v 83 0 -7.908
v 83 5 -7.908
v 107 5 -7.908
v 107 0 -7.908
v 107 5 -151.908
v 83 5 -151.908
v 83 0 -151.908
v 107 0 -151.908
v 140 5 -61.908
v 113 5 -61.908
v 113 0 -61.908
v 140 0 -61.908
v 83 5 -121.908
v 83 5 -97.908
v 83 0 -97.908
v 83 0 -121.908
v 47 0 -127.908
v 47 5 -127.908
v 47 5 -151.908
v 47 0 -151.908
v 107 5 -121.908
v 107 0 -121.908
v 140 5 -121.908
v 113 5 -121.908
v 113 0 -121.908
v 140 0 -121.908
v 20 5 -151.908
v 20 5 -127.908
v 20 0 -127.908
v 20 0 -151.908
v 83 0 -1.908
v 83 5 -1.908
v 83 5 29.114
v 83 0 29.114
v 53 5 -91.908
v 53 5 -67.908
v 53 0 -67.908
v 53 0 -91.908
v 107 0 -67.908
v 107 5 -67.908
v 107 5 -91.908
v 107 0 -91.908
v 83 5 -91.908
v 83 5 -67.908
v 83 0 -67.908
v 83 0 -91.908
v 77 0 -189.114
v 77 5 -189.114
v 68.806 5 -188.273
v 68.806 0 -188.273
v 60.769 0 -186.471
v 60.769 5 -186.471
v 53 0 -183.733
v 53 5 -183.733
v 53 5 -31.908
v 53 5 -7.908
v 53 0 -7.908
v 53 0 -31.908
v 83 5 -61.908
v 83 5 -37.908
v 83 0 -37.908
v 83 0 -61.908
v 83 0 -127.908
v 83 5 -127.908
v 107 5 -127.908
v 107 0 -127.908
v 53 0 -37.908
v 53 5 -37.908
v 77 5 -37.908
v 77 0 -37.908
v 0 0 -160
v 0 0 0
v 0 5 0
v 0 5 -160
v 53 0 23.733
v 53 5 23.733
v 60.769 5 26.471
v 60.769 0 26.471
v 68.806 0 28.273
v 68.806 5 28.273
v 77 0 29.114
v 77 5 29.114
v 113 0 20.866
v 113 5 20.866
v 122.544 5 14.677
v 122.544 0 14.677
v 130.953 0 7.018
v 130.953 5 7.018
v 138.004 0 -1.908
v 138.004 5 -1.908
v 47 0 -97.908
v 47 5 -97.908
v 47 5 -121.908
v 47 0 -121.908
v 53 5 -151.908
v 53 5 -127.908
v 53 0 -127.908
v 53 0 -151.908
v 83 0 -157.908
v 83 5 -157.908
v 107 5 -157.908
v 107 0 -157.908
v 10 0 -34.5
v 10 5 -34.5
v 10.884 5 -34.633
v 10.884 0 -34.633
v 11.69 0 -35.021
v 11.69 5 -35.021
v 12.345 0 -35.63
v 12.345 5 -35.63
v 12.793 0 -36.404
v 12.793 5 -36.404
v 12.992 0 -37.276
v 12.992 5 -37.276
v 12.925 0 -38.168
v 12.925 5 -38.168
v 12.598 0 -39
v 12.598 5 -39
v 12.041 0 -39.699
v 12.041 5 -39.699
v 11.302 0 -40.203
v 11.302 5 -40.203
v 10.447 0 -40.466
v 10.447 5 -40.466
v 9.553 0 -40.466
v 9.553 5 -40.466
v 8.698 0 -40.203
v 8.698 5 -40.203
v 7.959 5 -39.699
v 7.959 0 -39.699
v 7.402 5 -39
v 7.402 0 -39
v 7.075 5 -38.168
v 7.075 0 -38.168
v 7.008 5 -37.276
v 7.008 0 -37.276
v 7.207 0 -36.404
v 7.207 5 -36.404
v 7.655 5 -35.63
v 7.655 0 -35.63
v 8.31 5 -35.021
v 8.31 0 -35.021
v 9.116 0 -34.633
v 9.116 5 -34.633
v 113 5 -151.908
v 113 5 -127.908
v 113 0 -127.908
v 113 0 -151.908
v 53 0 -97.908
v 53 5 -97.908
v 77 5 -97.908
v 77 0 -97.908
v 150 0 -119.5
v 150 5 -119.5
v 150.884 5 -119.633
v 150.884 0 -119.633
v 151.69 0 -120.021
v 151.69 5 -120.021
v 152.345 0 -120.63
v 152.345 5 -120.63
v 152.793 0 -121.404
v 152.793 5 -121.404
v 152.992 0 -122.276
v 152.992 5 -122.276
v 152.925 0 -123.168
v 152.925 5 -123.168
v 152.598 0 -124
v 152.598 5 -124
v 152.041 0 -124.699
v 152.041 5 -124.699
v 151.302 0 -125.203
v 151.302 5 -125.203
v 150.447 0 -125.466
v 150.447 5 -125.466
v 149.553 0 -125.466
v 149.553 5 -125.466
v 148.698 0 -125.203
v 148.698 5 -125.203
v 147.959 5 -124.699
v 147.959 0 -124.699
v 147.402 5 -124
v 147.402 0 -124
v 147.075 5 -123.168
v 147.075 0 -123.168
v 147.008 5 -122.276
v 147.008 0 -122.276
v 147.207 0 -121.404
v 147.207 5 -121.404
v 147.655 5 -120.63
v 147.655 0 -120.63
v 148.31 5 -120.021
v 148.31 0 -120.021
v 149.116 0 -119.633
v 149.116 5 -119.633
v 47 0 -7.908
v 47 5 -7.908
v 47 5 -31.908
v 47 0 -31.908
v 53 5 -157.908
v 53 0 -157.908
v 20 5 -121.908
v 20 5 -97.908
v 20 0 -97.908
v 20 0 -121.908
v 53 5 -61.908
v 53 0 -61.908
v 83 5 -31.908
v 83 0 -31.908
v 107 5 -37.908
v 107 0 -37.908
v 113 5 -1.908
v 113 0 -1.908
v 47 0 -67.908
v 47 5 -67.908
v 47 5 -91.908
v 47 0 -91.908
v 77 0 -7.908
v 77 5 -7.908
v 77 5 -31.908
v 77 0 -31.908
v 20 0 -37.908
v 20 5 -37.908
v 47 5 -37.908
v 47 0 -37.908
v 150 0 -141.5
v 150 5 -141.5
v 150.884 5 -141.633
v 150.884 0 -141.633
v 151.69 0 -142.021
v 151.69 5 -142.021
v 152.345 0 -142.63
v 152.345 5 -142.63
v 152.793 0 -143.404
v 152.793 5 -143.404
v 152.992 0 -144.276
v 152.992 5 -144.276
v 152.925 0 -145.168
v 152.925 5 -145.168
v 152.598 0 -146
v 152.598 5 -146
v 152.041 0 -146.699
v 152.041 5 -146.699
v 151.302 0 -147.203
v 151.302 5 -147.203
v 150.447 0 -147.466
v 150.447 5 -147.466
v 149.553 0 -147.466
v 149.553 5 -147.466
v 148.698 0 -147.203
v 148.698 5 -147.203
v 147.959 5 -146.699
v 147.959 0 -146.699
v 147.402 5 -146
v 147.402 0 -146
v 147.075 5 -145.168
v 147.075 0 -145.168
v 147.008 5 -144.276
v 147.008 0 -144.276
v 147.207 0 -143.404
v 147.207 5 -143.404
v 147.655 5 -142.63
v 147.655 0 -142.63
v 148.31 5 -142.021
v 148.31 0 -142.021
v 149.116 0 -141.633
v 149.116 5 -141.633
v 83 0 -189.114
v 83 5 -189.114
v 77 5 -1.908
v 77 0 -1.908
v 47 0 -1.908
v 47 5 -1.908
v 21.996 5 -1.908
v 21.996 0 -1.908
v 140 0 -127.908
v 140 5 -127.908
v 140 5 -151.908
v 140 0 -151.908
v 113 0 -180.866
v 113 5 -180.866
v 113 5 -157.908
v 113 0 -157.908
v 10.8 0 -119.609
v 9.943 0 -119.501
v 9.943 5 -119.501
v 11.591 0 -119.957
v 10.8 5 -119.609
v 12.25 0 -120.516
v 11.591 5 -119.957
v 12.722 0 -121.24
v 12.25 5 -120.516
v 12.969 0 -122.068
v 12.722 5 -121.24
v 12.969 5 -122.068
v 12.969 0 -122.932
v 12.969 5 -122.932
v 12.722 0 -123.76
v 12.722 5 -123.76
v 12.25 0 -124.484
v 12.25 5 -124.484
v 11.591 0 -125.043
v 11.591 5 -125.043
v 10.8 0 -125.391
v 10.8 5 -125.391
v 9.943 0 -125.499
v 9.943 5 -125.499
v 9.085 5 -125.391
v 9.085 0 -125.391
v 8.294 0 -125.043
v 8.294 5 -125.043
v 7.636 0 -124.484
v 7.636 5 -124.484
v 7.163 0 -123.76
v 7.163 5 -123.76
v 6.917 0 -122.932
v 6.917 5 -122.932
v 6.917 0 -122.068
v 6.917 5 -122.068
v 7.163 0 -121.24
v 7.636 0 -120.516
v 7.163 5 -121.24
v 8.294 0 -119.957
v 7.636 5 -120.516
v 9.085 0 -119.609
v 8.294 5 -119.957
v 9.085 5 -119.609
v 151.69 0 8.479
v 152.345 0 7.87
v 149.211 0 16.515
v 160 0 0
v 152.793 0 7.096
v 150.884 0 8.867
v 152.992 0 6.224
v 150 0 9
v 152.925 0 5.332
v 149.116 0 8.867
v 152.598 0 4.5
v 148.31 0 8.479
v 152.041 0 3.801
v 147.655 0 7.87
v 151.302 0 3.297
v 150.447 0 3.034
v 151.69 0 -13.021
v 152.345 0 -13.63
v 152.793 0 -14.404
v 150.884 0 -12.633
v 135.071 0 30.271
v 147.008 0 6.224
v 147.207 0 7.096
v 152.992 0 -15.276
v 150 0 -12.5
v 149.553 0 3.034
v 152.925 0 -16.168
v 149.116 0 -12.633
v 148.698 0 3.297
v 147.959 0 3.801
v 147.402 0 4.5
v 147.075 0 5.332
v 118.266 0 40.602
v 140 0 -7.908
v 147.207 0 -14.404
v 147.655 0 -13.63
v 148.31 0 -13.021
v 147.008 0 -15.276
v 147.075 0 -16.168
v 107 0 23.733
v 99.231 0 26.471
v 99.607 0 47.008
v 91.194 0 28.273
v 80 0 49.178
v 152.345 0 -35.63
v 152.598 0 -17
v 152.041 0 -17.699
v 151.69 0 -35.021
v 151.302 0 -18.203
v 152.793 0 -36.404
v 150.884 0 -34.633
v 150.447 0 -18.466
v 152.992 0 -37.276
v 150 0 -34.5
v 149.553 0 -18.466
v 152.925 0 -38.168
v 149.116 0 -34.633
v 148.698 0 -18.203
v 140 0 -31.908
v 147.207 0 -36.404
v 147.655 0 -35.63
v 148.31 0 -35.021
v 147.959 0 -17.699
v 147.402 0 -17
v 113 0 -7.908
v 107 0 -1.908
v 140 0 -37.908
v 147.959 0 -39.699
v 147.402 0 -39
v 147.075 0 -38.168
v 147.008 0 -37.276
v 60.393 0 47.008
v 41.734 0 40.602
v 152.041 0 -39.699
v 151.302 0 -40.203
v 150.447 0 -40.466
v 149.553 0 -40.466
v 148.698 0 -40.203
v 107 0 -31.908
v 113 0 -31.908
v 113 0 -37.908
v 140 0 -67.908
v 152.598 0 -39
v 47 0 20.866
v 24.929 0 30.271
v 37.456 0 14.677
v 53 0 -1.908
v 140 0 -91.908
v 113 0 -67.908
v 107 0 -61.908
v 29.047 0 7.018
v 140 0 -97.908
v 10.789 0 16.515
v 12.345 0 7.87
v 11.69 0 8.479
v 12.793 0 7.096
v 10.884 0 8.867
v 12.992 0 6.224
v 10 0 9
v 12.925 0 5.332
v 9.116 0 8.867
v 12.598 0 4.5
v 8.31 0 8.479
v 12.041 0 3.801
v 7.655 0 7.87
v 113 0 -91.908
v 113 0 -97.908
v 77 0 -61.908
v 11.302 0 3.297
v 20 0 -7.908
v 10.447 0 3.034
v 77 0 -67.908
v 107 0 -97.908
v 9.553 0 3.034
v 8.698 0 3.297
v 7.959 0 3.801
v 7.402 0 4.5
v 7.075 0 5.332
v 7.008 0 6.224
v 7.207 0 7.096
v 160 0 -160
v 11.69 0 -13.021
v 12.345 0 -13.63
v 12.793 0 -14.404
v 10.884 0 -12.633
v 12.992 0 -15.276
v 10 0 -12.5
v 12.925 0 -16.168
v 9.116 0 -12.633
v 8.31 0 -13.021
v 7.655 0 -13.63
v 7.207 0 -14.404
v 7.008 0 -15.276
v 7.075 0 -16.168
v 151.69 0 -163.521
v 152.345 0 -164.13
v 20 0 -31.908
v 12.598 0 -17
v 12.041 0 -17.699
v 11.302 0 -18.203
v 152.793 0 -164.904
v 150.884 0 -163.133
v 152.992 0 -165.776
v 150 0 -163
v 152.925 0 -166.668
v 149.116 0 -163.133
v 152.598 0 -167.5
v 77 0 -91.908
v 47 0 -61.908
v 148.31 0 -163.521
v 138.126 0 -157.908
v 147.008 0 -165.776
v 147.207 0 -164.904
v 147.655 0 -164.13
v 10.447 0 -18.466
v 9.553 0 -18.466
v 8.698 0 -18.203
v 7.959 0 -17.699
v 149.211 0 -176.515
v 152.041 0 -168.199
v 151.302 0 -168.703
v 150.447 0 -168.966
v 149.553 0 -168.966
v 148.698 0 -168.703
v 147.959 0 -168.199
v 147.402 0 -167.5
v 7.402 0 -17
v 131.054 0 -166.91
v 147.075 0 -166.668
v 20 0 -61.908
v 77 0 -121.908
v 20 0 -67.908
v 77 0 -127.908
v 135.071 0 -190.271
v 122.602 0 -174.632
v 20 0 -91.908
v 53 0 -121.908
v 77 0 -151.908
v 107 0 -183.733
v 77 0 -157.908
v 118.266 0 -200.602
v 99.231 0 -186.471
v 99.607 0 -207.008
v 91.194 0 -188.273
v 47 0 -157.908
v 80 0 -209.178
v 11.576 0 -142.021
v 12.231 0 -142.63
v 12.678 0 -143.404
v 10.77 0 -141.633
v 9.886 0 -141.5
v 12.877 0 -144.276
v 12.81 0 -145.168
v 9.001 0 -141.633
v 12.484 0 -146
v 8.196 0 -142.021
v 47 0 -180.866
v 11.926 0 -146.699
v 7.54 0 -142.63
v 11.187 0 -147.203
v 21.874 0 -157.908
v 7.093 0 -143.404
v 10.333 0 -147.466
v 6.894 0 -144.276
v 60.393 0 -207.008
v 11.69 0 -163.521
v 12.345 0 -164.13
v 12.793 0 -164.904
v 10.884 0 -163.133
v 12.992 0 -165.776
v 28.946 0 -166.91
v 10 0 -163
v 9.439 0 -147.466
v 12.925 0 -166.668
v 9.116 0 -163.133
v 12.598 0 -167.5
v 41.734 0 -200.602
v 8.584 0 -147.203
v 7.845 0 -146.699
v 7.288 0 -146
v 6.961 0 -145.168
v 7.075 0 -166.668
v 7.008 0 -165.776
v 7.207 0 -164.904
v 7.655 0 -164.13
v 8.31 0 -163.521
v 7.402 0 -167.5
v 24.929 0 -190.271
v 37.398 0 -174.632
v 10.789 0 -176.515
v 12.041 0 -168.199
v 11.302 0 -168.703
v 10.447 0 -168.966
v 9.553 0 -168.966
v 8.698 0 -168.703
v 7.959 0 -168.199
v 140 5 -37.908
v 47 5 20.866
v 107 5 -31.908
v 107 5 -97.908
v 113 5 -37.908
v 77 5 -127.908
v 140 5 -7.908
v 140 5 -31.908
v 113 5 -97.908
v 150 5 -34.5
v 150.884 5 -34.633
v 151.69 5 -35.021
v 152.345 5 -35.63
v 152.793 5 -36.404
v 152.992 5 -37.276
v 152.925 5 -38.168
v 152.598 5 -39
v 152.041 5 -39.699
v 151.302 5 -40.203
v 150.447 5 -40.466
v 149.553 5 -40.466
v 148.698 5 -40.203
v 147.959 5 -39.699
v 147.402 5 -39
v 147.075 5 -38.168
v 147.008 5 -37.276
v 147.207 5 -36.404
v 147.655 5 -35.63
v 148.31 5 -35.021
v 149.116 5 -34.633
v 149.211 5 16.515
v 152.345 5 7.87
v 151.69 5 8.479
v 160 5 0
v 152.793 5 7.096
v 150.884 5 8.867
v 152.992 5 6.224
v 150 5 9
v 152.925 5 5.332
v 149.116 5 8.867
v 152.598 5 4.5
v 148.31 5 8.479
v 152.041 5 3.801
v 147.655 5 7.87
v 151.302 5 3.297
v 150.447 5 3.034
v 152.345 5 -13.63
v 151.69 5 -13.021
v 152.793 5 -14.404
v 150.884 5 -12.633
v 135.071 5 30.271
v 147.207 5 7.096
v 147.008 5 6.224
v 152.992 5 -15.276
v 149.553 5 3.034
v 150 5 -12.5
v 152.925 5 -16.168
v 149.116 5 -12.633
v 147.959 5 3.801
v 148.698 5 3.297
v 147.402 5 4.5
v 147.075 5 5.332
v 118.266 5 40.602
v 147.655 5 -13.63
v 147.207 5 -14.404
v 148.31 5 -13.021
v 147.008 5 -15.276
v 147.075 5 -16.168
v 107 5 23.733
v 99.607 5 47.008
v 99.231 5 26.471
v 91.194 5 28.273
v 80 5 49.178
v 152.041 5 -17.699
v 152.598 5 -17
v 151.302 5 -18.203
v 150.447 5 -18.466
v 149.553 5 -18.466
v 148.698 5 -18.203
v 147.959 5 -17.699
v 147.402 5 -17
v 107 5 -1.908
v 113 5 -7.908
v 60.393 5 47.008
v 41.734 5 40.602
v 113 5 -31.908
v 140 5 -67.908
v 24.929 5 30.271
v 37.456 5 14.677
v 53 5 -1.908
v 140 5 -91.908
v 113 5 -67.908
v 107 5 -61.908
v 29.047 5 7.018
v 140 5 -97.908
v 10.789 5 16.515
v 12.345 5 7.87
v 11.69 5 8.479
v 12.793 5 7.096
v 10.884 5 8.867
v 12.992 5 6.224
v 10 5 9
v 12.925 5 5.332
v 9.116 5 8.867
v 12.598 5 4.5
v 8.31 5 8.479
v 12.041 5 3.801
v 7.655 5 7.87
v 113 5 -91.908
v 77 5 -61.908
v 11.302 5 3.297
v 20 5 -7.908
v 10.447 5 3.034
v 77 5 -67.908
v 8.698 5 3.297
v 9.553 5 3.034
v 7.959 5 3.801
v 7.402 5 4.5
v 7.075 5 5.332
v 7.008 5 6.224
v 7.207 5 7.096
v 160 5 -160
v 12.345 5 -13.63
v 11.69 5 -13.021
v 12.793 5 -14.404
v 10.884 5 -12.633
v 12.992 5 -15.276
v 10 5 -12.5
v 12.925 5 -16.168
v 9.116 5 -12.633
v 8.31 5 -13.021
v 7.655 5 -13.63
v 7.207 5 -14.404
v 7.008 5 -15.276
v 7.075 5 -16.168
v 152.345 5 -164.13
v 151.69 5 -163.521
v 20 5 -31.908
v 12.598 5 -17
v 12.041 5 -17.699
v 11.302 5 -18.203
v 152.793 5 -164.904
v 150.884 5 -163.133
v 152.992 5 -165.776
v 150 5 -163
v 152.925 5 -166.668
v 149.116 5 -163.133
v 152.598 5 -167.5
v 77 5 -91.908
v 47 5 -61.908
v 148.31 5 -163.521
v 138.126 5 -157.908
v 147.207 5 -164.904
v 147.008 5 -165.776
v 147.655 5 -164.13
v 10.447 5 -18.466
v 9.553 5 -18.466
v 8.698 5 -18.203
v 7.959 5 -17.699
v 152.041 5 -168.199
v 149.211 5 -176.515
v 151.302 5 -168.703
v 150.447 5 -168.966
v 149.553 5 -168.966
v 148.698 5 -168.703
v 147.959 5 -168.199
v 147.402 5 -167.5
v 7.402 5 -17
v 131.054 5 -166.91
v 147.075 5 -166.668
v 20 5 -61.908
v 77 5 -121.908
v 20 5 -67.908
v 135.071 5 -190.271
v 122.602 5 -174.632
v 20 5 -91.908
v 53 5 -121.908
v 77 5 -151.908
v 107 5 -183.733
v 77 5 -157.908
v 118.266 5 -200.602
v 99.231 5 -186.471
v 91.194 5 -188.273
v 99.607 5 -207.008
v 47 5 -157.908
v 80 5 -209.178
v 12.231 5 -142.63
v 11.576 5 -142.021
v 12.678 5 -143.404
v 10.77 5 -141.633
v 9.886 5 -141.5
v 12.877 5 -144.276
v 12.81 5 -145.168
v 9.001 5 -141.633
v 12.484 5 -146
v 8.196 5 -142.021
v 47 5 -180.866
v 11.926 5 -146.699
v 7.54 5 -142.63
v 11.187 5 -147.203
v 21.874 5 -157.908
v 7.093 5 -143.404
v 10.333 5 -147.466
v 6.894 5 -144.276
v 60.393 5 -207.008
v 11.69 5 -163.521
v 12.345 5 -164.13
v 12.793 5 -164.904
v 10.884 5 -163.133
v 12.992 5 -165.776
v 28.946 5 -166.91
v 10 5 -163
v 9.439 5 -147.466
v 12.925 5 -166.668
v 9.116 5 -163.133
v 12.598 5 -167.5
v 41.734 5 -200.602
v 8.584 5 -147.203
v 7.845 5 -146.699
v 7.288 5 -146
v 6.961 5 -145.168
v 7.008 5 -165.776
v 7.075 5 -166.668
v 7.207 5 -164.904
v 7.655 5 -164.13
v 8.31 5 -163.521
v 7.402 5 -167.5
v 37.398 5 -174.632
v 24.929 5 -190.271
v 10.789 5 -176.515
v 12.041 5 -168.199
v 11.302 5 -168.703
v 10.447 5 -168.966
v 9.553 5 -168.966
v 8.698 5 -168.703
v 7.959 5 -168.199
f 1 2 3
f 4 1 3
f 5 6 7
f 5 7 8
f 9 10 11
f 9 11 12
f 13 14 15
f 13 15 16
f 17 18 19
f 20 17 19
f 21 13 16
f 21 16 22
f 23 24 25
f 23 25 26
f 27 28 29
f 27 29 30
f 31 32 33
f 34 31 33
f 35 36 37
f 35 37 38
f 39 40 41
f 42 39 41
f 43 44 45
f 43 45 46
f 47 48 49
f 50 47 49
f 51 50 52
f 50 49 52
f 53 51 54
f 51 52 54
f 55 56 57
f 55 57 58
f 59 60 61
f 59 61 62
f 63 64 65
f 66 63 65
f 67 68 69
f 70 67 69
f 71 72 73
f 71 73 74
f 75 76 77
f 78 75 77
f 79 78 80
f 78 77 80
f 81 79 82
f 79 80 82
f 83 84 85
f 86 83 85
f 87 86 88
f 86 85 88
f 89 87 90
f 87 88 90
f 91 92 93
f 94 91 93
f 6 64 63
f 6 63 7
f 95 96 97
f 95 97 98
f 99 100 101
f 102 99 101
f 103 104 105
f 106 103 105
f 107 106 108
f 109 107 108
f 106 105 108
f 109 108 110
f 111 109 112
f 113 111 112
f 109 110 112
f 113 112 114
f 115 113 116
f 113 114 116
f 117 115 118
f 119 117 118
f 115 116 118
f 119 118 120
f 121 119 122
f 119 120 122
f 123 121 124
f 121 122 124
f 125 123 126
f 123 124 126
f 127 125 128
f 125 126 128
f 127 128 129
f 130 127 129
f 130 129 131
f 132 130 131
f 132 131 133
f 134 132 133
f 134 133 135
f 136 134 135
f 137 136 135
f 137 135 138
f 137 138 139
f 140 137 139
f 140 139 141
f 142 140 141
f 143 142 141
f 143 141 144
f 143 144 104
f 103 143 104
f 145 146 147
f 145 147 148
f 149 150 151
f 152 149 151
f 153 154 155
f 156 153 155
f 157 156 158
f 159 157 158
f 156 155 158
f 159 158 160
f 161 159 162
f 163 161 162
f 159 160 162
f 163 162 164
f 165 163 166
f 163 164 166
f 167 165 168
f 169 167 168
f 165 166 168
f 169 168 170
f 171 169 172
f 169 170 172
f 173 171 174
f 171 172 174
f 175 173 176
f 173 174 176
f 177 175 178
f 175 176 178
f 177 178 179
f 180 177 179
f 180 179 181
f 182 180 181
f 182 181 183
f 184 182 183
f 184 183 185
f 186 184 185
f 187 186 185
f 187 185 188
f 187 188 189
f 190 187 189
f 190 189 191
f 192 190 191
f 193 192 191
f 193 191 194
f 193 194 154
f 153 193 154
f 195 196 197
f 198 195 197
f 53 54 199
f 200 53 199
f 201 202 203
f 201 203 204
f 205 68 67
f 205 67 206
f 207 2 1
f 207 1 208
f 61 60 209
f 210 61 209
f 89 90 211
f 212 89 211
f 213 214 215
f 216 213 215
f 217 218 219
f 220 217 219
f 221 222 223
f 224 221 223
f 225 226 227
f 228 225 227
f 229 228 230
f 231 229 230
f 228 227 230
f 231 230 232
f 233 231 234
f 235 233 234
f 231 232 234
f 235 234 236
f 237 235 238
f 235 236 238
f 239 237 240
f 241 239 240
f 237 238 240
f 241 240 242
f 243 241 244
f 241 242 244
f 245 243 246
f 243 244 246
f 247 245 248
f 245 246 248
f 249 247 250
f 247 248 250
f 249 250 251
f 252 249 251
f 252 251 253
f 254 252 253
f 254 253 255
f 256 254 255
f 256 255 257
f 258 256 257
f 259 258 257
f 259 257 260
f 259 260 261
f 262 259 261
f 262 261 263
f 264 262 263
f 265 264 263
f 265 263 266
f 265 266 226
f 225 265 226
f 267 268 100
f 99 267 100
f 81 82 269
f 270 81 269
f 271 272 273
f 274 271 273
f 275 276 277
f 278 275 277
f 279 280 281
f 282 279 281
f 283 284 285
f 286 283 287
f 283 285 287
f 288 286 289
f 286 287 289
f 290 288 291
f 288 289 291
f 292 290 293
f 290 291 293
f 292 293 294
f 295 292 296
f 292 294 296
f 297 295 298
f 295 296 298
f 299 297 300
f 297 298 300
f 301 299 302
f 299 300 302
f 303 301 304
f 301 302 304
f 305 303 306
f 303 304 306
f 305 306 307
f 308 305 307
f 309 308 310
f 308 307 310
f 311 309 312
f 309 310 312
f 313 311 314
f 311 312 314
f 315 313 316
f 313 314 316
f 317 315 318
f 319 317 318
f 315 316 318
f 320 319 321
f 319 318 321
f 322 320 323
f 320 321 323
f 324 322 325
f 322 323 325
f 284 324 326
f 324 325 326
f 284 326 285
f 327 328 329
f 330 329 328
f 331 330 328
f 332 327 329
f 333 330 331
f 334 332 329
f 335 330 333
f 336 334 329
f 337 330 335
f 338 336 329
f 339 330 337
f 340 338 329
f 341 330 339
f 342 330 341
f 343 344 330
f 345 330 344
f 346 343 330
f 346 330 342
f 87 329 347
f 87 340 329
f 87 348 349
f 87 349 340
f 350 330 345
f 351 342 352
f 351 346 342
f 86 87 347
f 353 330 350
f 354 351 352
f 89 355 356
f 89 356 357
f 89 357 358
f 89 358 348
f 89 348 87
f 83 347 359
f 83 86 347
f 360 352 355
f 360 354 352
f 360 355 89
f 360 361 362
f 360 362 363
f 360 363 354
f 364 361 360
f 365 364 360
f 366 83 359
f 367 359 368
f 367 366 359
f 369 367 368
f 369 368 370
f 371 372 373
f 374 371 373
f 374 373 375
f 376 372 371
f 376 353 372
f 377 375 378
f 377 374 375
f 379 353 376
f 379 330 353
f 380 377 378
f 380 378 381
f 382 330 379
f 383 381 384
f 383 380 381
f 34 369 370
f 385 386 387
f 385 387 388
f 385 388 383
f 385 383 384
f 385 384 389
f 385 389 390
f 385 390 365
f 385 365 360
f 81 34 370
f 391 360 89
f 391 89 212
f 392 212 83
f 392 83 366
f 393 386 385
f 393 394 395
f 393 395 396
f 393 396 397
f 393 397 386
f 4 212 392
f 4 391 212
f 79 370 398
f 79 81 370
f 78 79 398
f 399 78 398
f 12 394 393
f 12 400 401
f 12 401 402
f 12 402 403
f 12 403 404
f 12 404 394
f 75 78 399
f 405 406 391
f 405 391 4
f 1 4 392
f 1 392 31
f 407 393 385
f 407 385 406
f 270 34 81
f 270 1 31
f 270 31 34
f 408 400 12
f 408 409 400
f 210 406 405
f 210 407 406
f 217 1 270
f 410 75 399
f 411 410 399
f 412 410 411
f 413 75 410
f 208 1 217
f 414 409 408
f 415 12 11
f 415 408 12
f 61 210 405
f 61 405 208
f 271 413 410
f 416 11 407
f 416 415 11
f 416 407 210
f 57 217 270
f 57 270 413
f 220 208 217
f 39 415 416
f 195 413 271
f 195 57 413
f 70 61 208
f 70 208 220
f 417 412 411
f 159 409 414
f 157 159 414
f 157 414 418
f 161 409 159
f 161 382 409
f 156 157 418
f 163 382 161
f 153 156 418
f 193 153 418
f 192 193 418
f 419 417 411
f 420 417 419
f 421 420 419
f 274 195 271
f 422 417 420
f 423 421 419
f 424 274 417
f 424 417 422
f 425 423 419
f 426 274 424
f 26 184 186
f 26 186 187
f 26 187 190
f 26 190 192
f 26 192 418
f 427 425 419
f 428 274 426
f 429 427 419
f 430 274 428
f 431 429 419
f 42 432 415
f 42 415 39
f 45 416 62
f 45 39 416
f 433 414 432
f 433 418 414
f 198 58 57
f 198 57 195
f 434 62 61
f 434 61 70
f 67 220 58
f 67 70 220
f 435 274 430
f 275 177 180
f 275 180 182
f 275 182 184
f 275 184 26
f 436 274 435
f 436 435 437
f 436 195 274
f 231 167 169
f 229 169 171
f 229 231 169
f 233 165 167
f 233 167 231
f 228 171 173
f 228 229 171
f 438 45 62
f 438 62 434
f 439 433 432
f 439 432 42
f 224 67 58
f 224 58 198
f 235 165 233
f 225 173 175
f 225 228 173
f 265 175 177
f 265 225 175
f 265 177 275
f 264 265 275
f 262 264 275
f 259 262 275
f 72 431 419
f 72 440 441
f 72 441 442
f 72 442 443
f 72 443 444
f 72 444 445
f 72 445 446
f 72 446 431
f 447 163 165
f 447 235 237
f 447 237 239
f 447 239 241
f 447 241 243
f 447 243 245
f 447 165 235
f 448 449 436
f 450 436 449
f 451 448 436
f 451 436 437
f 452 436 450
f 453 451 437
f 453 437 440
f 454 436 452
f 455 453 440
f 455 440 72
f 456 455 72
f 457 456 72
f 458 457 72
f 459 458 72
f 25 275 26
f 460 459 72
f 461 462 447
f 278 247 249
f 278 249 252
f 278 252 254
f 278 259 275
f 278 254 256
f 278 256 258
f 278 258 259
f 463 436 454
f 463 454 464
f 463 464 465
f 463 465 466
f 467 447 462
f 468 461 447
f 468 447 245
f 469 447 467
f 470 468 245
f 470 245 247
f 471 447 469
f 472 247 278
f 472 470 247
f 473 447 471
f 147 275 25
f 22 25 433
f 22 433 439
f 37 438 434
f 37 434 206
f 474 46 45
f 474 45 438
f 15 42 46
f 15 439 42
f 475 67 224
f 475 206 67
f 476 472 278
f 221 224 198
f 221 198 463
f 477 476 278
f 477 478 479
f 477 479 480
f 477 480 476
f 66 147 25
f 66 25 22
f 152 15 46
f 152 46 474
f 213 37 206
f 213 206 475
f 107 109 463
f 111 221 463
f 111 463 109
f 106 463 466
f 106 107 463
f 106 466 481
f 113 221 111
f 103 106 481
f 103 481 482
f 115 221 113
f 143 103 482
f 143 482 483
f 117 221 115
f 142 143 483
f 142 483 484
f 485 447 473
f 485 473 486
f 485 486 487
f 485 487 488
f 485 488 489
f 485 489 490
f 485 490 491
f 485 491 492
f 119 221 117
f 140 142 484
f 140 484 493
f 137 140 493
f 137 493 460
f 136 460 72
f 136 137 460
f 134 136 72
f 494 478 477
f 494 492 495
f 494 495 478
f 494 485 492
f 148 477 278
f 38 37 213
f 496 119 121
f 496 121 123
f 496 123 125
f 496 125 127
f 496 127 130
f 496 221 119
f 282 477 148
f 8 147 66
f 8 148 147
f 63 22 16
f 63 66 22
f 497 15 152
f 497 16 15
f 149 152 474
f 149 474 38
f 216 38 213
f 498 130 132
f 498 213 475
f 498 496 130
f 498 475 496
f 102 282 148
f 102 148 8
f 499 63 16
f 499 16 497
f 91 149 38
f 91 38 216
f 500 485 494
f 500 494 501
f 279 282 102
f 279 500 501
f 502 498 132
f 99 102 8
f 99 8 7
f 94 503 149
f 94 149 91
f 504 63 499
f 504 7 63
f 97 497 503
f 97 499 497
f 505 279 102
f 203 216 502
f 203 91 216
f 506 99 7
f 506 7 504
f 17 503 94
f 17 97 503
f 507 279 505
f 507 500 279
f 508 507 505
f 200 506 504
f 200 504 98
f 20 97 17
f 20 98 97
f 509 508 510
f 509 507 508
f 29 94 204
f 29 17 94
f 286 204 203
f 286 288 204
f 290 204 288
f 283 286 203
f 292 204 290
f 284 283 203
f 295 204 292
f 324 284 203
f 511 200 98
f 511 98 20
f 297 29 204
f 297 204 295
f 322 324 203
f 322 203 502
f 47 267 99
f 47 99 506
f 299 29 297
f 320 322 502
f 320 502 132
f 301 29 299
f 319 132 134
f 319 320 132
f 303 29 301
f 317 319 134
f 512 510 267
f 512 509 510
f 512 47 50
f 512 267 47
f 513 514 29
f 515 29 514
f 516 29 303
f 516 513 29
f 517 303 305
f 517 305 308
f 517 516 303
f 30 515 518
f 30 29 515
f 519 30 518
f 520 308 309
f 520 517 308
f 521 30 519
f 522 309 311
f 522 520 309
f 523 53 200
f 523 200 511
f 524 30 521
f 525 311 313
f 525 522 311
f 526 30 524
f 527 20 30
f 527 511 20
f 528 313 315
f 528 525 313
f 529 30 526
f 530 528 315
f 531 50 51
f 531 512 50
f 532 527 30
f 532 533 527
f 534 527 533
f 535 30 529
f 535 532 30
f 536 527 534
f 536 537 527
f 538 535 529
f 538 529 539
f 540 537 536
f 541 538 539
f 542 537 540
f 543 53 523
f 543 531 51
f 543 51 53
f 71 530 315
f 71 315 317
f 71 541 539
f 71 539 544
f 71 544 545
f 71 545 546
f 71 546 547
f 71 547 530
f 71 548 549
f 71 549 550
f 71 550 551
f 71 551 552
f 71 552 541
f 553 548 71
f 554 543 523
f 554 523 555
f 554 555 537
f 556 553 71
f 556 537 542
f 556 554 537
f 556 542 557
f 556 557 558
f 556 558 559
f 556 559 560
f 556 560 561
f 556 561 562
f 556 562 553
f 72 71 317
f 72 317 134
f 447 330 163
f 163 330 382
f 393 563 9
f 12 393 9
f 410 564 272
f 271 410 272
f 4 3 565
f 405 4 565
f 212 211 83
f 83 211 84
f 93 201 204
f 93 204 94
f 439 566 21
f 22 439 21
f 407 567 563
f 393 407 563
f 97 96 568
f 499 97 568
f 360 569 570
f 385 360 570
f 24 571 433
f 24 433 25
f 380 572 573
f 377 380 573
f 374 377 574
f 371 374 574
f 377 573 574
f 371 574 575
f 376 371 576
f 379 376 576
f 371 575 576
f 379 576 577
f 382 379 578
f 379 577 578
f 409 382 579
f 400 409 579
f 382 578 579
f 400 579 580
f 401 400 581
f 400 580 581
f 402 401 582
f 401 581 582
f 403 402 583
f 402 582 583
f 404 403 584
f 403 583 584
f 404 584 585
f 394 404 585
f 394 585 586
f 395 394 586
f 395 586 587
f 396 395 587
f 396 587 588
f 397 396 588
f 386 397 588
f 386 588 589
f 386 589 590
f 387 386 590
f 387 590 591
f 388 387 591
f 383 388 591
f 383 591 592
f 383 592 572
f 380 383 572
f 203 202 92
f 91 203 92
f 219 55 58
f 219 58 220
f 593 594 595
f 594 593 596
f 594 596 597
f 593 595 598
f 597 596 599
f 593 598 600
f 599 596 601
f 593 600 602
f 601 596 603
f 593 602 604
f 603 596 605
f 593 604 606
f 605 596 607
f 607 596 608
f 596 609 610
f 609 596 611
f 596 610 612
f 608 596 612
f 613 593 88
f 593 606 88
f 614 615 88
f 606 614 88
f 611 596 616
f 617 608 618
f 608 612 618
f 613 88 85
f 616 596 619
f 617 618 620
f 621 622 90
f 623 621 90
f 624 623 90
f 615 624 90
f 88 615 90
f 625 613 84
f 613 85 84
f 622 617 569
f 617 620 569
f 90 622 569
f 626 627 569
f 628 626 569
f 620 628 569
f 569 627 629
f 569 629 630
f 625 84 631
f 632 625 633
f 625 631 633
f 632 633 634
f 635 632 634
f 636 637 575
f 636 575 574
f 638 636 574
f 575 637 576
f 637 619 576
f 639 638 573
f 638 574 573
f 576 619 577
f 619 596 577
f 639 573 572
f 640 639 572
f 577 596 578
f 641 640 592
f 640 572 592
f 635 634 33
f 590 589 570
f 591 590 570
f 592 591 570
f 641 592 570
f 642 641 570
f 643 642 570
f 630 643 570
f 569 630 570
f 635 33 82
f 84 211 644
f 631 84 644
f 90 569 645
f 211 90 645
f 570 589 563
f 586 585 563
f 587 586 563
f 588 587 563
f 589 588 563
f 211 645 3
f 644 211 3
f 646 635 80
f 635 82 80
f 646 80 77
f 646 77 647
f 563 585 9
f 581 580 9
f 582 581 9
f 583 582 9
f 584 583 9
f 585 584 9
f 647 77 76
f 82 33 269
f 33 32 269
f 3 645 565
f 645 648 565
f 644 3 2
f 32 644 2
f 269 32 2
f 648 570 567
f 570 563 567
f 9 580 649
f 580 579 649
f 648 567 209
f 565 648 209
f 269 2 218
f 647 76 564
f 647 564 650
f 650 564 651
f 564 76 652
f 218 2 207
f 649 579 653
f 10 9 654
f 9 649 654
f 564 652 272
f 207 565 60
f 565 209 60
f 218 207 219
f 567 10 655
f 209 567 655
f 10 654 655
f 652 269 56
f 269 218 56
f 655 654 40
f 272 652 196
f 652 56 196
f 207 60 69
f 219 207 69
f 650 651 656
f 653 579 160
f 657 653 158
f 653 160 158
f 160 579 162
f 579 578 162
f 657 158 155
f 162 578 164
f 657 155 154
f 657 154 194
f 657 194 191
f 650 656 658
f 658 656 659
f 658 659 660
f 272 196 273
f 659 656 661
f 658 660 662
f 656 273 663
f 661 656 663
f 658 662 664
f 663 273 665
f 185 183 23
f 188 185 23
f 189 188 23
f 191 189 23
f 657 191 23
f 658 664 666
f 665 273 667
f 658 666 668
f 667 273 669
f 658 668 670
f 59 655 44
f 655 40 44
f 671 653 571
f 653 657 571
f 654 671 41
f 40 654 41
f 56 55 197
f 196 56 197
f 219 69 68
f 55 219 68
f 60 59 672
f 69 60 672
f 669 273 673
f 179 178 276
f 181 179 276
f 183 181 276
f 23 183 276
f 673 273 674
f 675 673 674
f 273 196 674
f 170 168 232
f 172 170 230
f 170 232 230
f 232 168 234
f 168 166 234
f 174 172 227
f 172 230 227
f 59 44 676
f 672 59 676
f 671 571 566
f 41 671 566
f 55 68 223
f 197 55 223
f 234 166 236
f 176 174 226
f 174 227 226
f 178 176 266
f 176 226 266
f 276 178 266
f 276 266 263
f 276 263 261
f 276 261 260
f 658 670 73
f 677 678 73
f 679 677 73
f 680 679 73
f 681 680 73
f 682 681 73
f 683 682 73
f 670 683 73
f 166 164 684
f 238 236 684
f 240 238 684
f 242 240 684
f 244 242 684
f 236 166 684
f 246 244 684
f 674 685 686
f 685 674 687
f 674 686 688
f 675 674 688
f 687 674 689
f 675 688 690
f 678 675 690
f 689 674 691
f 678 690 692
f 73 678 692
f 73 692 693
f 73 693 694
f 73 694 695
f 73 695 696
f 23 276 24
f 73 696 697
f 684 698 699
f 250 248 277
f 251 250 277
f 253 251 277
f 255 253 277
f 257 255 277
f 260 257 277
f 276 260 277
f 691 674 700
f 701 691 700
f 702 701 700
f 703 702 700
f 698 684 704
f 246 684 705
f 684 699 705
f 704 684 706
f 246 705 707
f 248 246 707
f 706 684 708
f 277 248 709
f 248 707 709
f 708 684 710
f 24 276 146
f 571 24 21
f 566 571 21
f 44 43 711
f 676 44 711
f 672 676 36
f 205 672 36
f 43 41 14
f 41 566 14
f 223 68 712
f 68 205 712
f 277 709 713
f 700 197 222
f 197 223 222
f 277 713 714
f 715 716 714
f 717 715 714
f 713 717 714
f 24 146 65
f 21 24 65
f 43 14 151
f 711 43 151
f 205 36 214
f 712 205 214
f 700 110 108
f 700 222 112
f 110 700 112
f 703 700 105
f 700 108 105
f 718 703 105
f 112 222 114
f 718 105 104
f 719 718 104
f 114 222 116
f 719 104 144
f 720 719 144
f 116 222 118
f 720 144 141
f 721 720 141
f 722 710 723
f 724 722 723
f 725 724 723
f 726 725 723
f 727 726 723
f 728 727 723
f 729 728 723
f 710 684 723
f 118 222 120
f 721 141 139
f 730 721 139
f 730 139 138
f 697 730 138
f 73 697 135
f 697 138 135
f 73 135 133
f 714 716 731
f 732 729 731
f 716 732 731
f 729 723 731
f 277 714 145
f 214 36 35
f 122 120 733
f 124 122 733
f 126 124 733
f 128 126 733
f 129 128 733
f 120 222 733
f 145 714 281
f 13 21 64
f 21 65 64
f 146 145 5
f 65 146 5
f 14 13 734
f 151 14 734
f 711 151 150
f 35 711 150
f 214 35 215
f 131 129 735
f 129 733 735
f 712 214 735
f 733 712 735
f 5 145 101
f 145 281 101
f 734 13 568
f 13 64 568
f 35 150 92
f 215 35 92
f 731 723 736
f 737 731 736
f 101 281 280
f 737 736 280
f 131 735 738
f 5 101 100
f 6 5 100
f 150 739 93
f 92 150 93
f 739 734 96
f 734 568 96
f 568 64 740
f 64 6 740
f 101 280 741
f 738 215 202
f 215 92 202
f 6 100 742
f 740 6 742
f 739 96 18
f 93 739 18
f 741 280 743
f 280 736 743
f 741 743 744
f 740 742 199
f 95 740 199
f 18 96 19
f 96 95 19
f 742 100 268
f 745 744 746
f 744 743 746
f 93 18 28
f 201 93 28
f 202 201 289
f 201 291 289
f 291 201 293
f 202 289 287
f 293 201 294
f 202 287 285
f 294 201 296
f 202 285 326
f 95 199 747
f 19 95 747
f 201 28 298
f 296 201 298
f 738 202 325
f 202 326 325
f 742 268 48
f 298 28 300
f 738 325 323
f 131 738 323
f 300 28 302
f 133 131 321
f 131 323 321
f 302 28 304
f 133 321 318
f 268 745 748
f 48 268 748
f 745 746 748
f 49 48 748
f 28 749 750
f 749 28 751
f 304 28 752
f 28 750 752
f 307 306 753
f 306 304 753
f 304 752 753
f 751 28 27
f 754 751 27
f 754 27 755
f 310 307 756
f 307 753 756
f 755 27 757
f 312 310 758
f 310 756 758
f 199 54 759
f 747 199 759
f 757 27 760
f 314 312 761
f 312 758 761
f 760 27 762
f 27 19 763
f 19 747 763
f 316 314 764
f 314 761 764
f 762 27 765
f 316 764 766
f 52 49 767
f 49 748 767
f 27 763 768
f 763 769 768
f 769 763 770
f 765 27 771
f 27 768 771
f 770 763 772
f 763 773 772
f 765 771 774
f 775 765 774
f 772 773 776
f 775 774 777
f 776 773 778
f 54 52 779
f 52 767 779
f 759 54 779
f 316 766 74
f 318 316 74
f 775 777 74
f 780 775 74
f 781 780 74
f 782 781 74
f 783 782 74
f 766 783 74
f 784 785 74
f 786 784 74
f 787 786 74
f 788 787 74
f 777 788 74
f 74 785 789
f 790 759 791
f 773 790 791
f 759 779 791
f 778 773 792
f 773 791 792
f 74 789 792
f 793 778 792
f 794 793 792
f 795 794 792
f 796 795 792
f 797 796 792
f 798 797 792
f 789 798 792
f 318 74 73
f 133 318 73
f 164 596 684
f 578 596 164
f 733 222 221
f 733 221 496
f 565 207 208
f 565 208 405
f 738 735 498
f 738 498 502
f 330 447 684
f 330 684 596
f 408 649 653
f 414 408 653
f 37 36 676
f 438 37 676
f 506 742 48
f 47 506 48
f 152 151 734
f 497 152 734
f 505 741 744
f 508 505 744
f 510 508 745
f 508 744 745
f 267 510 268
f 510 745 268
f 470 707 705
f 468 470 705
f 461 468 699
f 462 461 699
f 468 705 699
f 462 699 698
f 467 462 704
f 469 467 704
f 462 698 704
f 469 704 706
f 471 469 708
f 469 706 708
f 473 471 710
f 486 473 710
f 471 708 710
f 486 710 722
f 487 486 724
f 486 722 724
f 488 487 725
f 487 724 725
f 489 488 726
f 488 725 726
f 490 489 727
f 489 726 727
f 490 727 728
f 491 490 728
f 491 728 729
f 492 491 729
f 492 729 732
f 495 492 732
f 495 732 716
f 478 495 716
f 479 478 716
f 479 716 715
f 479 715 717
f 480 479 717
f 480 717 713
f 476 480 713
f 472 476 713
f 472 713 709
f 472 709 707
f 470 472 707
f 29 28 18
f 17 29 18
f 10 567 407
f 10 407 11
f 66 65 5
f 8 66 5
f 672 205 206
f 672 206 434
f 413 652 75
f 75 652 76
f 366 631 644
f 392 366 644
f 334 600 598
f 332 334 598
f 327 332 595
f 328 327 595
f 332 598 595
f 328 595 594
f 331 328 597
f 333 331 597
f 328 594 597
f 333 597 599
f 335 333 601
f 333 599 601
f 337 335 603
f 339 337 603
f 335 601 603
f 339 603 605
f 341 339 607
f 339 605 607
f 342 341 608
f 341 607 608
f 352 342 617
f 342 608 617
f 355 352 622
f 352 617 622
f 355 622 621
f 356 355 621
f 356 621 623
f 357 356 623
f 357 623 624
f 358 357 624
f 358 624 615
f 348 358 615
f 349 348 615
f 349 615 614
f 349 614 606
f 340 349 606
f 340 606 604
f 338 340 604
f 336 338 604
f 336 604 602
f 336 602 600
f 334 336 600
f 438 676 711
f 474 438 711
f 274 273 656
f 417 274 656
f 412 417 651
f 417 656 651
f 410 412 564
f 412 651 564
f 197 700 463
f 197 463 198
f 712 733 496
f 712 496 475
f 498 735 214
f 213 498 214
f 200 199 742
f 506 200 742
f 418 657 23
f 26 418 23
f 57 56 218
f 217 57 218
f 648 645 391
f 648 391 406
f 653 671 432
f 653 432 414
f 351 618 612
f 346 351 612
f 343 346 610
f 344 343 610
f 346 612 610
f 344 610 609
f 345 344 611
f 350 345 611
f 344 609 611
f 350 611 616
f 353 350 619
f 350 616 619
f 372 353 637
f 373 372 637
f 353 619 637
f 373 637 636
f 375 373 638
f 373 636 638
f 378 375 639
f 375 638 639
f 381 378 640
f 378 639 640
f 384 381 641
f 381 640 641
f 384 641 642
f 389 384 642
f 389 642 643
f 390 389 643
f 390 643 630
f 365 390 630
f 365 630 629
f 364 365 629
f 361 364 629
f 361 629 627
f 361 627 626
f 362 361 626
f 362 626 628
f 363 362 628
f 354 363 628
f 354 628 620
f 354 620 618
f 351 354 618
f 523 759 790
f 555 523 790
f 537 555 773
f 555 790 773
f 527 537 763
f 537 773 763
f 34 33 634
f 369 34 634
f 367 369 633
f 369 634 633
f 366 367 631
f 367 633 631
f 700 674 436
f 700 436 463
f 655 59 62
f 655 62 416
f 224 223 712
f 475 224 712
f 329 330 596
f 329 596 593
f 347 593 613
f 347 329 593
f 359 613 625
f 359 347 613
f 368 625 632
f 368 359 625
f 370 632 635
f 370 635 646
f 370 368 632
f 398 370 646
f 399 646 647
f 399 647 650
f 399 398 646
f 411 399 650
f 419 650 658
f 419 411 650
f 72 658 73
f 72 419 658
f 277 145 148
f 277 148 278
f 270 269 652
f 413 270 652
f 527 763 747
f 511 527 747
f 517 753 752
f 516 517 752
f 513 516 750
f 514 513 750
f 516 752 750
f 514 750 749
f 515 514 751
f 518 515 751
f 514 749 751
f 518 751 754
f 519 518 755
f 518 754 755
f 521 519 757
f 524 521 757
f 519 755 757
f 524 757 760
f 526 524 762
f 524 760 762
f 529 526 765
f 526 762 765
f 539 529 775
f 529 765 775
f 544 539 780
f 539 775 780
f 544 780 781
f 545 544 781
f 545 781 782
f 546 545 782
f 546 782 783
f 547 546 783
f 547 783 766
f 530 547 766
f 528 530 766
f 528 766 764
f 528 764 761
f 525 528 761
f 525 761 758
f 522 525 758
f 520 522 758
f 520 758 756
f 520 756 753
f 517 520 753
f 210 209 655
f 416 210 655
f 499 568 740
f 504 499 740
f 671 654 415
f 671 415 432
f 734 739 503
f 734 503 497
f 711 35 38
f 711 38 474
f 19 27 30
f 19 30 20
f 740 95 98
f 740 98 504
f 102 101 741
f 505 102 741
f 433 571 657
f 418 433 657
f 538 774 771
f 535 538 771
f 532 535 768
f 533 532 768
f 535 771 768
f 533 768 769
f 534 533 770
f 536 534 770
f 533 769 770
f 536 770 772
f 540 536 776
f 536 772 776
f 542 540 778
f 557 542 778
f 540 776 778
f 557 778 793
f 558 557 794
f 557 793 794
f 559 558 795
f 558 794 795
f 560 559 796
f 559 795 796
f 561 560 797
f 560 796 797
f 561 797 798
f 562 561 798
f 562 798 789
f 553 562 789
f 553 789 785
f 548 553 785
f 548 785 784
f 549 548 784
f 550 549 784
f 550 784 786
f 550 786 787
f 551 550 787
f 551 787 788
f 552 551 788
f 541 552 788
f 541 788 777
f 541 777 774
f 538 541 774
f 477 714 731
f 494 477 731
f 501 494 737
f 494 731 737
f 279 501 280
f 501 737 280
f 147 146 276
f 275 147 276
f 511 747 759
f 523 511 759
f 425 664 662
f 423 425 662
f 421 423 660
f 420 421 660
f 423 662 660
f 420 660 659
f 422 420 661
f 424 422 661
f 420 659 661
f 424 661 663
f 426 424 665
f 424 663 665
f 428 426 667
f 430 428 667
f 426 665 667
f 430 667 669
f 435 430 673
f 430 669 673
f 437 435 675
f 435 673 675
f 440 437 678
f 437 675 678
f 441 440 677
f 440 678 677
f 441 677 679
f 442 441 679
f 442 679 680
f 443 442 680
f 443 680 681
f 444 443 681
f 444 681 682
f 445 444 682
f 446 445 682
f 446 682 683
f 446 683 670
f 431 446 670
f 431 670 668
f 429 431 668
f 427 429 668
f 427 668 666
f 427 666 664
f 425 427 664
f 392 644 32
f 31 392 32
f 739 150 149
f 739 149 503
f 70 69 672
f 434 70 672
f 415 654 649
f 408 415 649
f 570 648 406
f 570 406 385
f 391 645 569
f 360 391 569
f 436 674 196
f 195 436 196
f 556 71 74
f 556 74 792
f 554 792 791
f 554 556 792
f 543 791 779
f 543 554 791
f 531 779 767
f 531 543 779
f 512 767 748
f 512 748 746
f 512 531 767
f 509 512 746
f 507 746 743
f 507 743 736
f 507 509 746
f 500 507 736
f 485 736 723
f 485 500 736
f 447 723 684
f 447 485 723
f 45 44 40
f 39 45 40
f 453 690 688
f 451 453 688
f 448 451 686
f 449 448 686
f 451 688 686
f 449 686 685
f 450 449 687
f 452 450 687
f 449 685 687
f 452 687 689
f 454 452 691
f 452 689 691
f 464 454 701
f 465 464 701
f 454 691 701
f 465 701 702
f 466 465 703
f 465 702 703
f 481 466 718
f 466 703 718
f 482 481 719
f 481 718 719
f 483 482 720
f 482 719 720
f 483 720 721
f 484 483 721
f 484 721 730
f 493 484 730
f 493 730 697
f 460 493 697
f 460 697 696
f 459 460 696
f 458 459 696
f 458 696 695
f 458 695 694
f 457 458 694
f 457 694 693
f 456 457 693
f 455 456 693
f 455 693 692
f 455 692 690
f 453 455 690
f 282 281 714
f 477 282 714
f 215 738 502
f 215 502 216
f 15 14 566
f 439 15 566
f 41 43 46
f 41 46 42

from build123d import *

# Parameters (mm, degrees)
BOSS_EXTRUDE1_DEPTH = 5
SKETCH4_W           = 27
SKETCH4_H           = 24
SKETCH4_W_2         = 24
CUT_EXTRUDE1_DEPTH  = 6
SKETCH5_R           = 3
CUT_EXTRUDE2_DEPTH  = 44
SKETCH6_R           = 3
CUT_EXTRUDE3_DEPTH  = 70
SKETCH7_R           = 3
CUT_EXTRUDE4_DEPTH  = 95


with BuildPart() as part:
    # Sketch1 → Boss-Extrude1 (new body)
    with BuildSketch(Plane(origin=(0, 0, 0), x_dir=(1, 0, 0), z_dir=(0, 1, 0))):
        with BuildLine():
            Line((0, 0), (0, 160))
            ThreePointArc((0, 160), (80, 209.178296965), (160, 160))
            Line((160, 160), (160, 0))
            ThreePointArc((160, 0), (80, -49.178296965), (0, 0))
        make_face()
    extrude(amount=BOSS_EXTRUDE1_DEPTH)

    # Sketch4 → Cut-Extrude1 (cut)
    with BuildSketch(Plane(origin=(0, 5, 0), x_dir=(1, 0, 0), z_dir=(0, 1, 0))):
        with BuildLine():
            Line((21.873652217, 157.907743676), (47, 157.907743676))
            Line((47, 157.907743676), (47, 180.865592736))
            ThreePointArc((47, 180.865592736), (33.013102641, 170.944870409), (21.873652217, 157.907743676))
        make_face()
        with BuildLine():
            Line((53, 157.907743676), (77, 157.907743676))
            Line((77, 157.907743676), (77, 189.11366611))
            ThreePointArc((77, 189.11366611), (64.76062681, 187.490880041), (53, 183.732775763))
            Line((53, 183.732775763), (53, 157.907743676))
        make_face()
        with BuildLine():
            Line((83, 157.907743676), (107, 157.907743676))
            Line((107, 157.907743676), (107, 183.732775763))
            ThreePointArc((107, 183.732775763), (95.23937319, 187.490880041), (83, 189.11366611))
            Line((83, 189.11366611), (83, 157.907743676))
        make_face()
        with BuildLine():
            Line((113, 157.907743676), (138.126347783, 157.907743676))
            ThreePointArc((138.126347783, 157.907743676), (126.986897359, 170.944870409), (113, 180.865592736))
            Line((113, 180.865592736), (113, 157.907743676))
        make_face()
        with Locations((126.5, 139.907743676)):
            Rectangle(SKETCH4_W, SKETCH4_H)
        with Locations((95, 139.907743676)):
            Rectangle(SKETCH4_W_2, SKETCH4_H)
        with Locations((65, 139.907743676)):
            Rectangle(SKETCH4_W_2, SKETCH4_H)
        with Locations((33.5, 139.907743676)):
            Rectangle(SKETCH4_W, SKETCH4_H)
        with Locations((33.5, 109.907743676)):
            Rectangle(SKETCH4_W, SKETCH4_H)
        with Locations((65, 109.907743676)):
            Rectangle(SKETCH4_W_2, SKETCH4_H)
        with Locations((95, 109.907743676)):
            Rectangle(SKETCH4_W_2, SKETCH4_H)
        with Locations((126.5, 109.907743676)):
            Rectangle(SKETCH4_W, SKETCH4_H)
        with Locations((126.5, 79.907743676)):
            Rectangle(SKETCH4_W, SKETCH4_H)
        with Locations((95, 79.907743676)):
            Rectangle(SKETCH4_W_2, SKETCH4_H)
        with Locations((65, 79.907743676)):
            Rectangle(SKETCH4_W_2, SKETCH4_H)
        with Locations((33.5, 79.907743676)):
            Rectangle(SKETCH4_W, SKETCH4_H)
        with Locations((33.5, 49.907743676)):
            Rectangle(SKETCH4_W, SKETCH4_H)
        with Locations((65, 49.907743676)):
            Rectangle(SKETCH4_W_2, SKETCH4_H)
        with Locations((95, 49.907743676)):
            Rectangle(SKETCH4_W_2, SKETCH4_H)
        with Locations((126.5, 49.907743676)):
            Rectangle(SKETCH4_W, SKETCH4_H)
        with Locations((126.5, 19.907743676)):
            Rectangle(SKETCH4_W, SKETCH4_H)
        with Locations((95, 19.907743676)):
            Rectangle(SKETCH4_W_2, SKETCH4_H)
        with Locations((65, 19.907743676)):
            Rectangle(SKETCH4_W_2, SKETCH4_H)
        with Locations((33.5, 19.907743676)):
            Rectangle(SKETCH4_W, SKETCH4_H)
        with BuildLine():
            Line((47, -20.865592736), (47, 1.907743676))
            Line((47, 1.907743676), (21.995929992, 1.907743676))
            ThreePointArc((21.995929992, 1.907743676), (33.09486806, -11.019460066), (47, -20.865592736))
        make_face()
        with BuildLine():
            Line((77, -29.11366611), (77, 1.907743676))
            Line((77, 1.907743676), (53, 1.907743676))
            Line((53, 1.907743676), (53, -23.732775763))
            ThreePointArc((53, -23.732775763), (64.76062681, -27.490880041), (77, -29.11366611))
        make_face()
        with BuildLine():
            Line((107, -23.732775763), (107, 1.907743676))
            Line((107, 1.907743676), (83, 1.907743676))
            Line((83, 1.907743676), (83, -29.11366611))
            ThreePointArc((83, -29.11366611), (95.23937319, -27.490880041), (107, -23.732775763))
        make_face()
        with BuildLine():
            ThreePointArc((113, -20.865592736), (126.90513194, -11.019460066), (138.004070008, 1.907743676))
            Line((138.004070008, 1.907743676), (113, 1.907743676))
            Line((113, 1.907743676), (113, -20.865592736))
        make_face()
    extrude(amount=-CUT_EXTRUDE1_DEPTH, mode=Mode.SUBTRACT)

    # Sketch5 → Cut-Extrude2 (cut)
    with BuildSketch(Plane(origin=(0, 5, 0), x_dir=(1, 0, 0), z_dir=(0, 1, 0))):
        with Locations(Location((10, 37.5, 0), (0, 0, 270))):
            Circle(SKETCH5_R)
        with Locations(Location((150, 37.5, 0), (0, 0, 270))):
            Circle(SKETCH5_R)
        with Locations(Location((150, 122.5, 0), (0, 0, 270))):
            Circle(SKETCH5_R)
        with Locations(Location((10, 122.5, 0), (0, 0, 270))):
            Circle(SKETCH5_R)
    extrude(amount=-CUT_EXTRUDE2_DEPTH, mode=Mode.SUBTRACT)

    # Sketch6 → Cut-Extrude3 (cut)
    with BuildSketch(Plane(origin=(0, 5, 0), x_dir=(1, 0, 0), z_dir=(0, 1, 0))):
        with Locations(Location((9.88568101, 144.5, 0), (0, 0, 270))):
            Circle(SKETCH6_R)
        with Locations((9.88568101, 122.5)):
            Circle(SKETCH6_R)
        with Locations(Location((10, 15.5, 0), (0, 0, 270))):
            Circle(SKETCH6_R)
        with Locations(Location((150, 144.5, 0), (0, 0, 270))):
            Circle(SKETCH6_R)
        with Locations(Location((150, 15.5, 0), (0, 0, 270))):
            Circle(SKETCH6_R)
    extrude(amount=-CUT_EXTRUDE3_DEPTH, mode=Mode.SUBTRACT)

    # Sketch7 → Cut-Extrude4 (cut)
    with BuildSketch(Plane(origin=(0, 5, 0), x_dir=(1, 0, 0), z_dir=(0, 1, 0))):
        with Locations(Location((10, 166, 0), (0, 0, 270))):
            Circle(SKETCH7_R)
        with Locations(Location((150, 166, 0), (0, 0, 270))):
            Circle(SKETCH7_R)
        with Locations(Location((150, -6, 0), (0, 0, 270))):
            Circle(SKETCH7_R)
        with Locations(Location((10, -6, 0), (0, 0, 270))):
            Circle(SKETCH7_R)
    extrude(amount=-CUT_EXTRUDE4_DEPTH, mode=Mode.SUBTRACT)


solid = part.part
